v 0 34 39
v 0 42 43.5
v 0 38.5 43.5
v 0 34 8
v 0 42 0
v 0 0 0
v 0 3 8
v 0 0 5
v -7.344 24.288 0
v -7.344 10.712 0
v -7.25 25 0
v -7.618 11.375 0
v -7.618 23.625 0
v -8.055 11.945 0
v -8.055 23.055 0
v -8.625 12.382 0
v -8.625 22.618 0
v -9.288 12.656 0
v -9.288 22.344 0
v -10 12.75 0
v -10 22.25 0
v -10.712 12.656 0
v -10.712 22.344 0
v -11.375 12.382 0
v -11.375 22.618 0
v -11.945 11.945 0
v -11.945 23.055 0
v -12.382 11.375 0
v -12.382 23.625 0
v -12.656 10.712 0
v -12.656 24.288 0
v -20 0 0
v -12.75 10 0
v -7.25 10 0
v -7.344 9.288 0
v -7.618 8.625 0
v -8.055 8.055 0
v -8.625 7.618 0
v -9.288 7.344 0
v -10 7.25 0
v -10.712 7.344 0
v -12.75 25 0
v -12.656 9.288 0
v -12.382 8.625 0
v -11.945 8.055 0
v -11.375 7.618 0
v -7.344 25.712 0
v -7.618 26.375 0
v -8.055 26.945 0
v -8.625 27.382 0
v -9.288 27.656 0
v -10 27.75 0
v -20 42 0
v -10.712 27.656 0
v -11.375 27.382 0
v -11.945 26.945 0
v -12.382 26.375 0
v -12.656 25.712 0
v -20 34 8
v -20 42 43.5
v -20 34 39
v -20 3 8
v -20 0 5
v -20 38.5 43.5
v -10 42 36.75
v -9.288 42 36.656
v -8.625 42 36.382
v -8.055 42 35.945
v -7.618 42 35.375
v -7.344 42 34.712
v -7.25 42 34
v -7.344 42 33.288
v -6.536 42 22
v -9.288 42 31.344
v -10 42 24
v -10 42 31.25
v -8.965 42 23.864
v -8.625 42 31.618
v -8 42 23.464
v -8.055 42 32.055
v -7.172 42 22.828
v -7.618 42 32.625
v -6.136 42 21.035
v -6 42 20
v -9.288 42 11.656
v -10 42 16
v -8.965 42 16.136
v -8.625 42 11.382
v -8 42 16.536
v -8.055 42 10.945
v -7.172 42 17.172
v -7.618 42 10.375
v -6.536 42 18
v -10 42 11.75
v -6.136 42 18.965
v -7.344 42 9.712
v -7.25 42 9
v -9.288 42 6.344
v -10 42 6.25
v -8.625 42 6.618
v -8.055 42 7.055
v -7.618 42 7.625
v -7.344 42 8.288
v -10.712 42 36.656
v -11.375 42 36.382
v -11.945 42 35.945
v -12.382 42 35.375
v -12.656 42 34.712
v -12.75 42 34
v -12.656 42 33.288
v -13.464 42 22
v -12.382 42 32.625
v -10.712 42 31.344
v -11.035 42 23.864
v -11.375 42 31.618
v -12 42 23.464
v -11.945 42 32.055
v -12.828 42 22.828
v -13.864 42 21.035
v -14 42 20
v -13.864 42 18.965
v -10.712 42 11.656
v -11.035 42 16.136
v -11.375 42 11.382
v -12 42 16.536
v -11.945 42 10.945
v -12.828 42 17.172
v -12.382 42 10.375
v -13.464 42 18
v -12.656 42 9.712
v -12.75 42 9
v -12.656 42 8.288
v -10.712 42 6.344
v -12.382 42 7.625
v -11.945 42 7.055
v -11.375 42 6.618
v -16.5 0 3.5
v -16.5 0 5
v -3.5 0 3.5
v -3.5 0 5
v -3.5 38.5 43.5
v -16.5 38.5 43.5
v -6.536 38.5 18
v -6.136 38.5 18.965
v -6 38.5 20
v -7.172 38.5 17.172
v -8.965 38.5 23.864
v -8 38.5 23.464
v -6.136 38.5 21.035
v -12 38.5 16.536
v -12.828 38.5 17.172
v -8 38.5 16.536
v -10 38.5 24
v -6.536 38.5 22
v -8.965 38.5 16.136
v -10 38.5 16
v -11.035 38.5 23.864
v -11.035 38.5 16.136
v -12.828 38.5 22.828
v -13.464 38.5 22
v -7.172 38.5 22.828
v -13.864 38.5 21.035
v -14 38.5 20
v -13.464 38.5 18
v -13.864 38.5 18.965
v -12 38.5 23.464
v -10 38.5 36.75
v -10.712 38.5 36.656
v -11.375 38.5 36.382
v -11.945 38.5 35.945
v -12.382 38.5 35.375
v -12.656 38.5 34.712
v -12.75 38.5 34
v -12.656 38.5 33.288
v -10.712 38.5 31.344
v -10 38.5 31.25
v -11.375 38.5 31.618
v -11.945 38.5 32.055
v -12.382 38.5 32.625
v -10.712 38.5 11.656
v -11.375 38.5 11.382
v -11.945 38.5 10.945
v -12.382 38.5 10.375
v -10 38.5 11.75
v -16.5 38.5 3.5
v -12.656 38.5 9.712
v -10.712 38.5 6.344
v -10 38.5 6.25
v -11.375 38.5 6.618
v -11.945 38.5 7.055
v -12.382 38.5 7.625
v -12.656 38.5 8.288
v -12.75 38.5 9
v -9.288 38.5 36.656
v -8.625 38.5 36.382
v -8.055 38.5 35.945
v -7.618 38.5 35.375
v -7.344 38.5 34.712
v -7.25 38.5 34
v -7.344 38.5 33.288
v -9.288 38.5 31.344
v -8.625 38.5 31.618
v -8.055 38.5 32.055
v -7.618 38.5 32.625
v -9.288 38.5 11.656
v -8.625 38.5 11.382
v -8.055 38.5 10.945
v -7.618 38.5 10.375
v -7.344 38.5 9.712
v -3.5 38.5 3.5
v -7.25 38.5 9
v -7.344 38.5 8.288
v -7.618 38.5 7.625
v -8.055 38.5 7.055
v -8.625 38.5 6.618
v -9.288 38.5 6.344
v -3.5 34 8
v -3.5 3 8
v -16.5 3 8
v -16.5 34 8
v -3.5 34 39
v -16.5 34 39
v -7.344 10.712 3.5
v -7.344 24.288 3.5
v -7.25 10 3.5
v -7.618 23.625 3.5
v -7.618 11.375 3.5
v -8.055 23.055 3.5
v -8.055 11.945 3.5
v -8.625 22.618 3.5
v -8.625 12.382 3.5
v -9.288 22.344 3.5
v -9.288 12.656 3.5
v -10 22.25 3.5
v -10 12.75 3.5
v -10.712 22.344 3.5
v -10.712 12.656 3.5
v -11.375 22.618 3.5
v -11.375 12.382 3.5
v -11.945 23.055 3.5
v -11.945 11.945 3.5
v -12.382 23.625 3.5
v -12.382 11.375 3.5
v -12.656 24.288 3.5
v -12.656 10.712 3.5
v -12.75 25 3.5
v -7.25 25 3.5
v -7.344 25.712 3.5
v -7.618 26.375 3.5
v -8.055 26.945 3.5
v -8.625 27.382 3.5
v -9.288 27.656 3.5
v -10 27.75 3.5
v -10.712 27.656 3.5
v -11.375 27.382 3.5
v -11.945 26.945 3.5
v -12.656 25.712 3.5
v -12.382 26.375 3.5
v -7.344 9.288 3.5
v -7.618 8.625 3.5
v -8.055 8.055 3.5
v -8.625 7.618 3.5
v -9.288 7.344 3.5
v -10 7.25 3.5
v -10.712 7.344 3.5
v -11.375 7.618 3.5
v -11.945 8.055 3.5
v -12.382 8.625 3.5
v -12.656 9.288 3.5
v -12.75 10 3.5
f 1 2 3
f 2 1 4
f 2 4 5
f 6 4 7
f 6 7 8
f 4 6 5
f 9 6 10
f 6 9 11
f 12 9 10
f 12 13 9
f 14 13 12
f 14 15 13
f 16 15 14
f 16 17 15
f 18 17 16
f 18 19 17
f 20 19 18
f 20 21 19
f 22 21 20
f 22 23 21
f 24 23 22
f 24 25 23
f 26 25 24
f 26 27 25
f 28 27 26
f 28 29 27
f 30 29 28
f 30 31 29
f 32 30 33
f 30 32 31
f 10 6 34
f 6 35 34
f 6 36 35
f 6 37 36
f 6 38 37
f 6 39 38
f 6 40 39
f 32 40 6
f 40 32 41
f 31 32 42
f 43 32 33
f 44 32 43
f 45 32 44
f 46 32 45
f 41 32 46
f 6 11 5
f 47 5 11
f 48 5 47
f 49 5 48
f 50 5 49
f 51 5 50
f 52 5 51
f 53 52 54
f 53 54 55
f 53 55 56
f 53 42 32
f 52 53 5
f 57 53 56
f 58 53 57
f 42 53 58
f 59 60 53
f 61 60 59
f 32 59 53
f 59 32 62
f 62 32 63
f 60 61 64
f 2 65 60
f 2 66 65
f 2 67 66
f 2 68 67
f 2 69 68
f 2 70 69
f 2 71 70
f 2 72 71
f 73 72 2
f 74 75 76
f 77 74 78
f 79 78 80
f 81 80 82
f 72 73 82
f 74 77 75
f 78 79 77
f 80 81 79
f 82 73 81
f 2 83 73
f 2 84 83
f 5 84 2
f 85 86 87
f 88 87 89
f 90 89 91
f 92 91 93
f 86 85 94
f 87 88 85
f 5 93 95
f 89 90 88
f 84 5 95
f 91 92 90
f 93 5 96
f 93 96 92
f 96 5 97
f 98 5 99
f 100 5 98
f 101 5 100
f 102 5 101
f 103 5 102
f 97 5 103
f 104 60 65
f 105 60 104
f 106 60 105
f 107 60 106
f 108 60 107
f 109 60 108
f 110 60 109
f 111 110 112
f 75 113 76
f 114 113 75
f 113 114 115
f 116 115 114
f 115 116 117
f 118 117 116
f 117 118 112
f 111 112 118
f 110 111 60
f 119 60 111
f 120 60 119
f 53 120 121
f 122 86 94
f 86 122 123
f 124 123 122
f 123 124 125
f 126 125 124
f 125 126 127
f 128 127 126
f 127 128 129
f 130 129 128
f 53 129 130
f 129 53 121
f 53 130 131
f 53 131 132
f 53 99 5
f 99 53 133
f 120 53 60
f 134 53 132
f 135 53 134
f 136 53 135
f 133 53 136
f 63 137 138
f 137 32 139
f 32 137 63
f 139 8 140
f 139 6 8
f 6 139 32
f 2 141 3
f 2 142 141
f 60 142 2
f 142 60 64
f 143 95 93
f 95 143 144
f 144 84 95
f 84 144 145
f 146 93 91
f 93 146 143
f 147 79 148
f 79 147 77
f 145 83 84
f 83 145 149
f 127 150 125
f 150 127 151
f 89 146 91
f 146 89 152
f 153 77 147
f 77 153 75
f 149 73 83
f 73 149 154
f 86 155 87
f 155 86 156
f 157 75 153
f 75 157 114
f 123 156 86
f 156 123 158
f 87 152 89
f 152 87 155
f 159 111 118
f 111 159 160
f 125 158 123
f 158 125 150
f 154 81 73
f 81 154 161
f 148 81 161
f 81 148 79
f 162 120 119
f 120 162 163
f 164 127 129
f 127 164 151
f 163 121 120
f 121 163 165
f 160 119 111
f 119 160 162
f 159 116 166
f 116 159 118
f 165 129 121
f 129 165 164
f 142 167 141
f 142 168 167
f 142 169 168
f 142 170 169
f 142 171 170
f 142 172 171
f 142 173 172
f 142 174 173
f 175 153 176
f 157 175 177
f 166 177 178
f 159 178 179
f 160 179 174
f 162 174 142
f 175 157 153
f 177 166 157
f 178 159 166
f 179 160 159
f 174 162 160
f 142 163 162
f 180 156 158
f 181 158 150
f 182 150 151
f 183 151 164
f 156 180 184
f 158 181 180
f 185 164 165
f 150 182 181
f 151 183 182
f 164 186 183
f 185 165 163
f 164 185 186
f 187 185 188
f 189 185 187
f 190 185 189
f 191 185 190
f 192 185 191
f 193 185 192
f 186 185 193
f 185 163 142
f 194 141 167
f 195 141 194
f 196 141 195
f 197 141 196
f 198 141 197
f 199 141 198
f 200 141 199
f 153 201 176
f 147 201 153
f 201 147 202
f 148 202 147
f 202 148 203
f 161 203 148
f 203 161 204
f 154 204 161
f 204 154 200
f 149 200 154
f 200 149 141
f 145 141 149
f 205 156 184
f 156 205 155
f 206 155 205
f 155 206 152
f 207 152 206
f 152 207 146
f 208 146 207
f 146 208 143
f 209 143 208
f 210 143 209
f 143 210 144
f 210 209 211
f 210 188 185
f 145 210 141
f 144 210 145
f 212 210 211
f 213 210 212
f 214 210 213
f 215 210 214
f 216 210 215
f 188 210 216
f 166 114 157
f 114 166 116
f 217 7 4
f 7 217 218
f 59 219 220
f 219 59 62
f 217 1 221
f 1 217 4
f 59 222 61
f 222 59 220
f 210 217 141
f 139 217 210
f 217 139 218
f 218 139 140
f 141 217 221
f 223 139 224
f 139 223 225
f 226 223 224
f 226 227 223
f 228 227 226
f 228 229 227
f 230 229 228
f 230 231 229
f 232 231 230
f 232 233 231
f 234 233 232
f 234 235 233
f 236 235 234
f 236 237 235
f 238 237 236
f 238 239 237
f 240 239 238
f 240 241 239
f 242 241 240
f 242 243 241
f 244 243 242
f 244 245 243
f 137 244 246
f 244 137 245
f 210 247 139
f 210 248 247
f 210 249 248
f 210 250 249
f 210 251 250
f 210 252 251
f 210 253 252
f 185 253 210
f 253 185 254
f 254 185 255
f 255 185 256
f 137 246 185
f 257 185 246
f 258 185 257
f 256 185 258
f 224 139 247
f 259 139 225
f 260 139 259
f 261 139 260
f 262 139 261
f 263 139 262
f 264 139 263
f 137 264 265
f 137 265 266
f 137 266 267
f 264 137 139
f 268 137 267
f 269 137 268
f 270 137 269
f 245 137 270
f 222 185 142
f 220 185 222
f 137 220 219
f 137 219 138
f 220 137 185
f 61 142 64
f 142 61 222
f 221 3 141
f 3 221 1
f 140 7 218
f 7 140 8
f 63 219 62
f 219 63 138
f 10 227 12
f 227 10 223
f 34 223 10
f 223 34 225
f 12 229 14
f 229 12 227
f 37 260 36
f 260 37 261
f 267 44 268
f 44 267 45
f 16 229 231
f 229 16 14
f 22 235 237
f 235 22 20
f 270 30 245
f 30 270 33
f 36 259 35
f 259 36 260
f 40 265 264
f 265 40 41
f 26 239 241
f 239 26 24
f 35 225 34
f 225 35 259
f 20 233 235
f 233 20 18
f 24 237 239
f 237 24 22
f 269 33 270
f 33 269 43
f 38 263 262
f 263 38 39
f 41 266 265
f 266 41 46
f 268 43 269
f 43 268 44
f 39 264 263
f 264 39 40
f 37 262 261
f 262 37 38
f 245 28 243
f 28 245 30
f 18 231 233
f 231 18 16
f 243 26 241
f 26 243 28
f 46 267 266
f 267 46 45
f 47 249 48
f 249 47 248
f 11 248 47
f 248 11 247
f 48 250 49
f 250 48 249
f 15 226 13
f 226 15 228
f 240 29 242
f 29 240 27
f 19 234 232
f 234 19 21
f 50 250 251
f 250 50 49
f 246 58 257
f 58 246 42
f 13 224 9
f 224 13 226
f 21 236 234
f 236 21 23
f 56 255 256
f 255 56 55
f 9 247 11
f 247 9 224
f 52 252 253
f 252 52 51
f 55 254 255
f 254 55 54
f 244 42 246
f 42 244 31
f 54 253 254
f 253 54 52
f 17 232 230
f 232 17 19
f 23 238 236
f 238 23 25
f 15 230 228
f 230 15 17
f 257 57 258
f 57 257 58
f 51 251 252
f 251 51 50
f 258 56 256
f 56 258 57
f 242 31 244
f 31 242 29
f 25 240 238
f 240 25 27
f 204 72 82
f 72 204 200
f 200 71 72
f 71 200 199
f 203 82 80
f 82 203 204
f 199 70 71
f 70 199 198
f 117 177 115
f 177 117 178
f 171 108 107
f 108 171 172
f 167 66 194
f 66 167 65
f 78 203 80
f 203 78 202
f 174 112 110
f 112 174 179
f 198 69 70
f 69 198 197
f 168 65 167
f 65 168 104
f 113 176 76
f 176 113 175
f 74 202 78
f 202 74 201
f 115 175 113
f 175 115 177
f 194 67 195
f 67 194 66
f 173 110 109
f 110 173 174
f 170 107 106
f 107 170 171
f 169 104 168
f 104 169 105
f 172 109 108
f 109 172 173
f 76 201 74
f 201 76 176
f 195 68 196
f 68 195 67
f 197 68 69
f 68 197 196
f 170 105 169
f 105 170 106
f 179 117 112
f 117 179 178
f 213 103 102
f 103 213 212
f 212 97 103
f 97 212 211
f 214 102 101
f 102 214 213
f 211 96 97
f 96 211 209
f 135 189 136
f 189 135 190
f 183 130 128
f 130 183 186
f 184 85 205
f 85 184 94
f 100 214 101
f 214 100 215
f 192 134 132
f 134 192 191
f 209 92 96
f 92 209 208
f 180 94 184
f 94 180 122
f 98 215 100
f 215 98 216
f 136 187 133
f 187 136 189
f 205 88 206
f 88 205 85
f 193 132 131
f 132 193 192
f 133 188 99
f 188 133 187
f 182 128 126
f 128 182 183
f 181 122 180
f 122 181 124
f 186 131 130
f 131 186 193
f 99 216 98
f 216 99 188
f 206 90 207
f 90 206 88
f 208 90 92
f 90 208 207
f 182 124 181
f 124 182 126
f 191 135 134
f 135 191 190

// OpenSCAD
t=3.5;

difference()
{
    union()
    {
        
        translate([-20,0,0])
            cube([20,42,t]);
        /*translate([0,42,0])
            cube([42,20,t]);*/
        
        translate([-20,0,t])
            cube([20,42,40]);
        /*translate([0,42,t])
            cube([33.5,20,30]);*/
    }
    
    union()
    {
        translate([-10,42-t,20])
            rotate([270,0,0])
                cylinder(d=8,h=t,$fn=24);
        
        translate([-20,0,20-12])
            cube([20,34,40]);
        
        
        translate([-20+t,0,t])
            cube([20-t*2,42-t,40]);
        translate([0+t,42+t,t])
            cube([33.5-t,20-t*2,30]);
        
        translate([-20,0,t+t-2])
            rotate([45,0,0])
                cube([20,42*sqrt(2),42*sqrt(2)]);
        translate([30+3.5,42,t+t-3.5])
            rotate([0,45+270,0])
                cube([33*sqrt(2),20,33*sqrt(2)]);
        
        translate([-10,10,0])
            cylinder(d=5.5,h=t,$fn=24);
        translate([-10,25,0])
            cylinder(d=5.5,h=t,$fn=24);
            
        translate([-10,42-t,20+14])
            rotate([270,0,0])
                cylinder(d=5.5,h=t,$fn=24);
        translate([-10,42-t,20-11])
            rotate([270,0,0])
                cylinder(d=5.5,h=t,$fn=24);
        
        translate([42-10,42+10,0])
            cylinder(d=5.5,h=t,$fn=24);
        translate([42-25,42+10,0])
            cylinder(d=5.5,h=t,$fn=24);
            
        translate([0,42+10,t+(30-t)/2])
            rotate([0,90,0])
                cylinder(d=5.5,h=t+1,$fn=24);
    }
}
